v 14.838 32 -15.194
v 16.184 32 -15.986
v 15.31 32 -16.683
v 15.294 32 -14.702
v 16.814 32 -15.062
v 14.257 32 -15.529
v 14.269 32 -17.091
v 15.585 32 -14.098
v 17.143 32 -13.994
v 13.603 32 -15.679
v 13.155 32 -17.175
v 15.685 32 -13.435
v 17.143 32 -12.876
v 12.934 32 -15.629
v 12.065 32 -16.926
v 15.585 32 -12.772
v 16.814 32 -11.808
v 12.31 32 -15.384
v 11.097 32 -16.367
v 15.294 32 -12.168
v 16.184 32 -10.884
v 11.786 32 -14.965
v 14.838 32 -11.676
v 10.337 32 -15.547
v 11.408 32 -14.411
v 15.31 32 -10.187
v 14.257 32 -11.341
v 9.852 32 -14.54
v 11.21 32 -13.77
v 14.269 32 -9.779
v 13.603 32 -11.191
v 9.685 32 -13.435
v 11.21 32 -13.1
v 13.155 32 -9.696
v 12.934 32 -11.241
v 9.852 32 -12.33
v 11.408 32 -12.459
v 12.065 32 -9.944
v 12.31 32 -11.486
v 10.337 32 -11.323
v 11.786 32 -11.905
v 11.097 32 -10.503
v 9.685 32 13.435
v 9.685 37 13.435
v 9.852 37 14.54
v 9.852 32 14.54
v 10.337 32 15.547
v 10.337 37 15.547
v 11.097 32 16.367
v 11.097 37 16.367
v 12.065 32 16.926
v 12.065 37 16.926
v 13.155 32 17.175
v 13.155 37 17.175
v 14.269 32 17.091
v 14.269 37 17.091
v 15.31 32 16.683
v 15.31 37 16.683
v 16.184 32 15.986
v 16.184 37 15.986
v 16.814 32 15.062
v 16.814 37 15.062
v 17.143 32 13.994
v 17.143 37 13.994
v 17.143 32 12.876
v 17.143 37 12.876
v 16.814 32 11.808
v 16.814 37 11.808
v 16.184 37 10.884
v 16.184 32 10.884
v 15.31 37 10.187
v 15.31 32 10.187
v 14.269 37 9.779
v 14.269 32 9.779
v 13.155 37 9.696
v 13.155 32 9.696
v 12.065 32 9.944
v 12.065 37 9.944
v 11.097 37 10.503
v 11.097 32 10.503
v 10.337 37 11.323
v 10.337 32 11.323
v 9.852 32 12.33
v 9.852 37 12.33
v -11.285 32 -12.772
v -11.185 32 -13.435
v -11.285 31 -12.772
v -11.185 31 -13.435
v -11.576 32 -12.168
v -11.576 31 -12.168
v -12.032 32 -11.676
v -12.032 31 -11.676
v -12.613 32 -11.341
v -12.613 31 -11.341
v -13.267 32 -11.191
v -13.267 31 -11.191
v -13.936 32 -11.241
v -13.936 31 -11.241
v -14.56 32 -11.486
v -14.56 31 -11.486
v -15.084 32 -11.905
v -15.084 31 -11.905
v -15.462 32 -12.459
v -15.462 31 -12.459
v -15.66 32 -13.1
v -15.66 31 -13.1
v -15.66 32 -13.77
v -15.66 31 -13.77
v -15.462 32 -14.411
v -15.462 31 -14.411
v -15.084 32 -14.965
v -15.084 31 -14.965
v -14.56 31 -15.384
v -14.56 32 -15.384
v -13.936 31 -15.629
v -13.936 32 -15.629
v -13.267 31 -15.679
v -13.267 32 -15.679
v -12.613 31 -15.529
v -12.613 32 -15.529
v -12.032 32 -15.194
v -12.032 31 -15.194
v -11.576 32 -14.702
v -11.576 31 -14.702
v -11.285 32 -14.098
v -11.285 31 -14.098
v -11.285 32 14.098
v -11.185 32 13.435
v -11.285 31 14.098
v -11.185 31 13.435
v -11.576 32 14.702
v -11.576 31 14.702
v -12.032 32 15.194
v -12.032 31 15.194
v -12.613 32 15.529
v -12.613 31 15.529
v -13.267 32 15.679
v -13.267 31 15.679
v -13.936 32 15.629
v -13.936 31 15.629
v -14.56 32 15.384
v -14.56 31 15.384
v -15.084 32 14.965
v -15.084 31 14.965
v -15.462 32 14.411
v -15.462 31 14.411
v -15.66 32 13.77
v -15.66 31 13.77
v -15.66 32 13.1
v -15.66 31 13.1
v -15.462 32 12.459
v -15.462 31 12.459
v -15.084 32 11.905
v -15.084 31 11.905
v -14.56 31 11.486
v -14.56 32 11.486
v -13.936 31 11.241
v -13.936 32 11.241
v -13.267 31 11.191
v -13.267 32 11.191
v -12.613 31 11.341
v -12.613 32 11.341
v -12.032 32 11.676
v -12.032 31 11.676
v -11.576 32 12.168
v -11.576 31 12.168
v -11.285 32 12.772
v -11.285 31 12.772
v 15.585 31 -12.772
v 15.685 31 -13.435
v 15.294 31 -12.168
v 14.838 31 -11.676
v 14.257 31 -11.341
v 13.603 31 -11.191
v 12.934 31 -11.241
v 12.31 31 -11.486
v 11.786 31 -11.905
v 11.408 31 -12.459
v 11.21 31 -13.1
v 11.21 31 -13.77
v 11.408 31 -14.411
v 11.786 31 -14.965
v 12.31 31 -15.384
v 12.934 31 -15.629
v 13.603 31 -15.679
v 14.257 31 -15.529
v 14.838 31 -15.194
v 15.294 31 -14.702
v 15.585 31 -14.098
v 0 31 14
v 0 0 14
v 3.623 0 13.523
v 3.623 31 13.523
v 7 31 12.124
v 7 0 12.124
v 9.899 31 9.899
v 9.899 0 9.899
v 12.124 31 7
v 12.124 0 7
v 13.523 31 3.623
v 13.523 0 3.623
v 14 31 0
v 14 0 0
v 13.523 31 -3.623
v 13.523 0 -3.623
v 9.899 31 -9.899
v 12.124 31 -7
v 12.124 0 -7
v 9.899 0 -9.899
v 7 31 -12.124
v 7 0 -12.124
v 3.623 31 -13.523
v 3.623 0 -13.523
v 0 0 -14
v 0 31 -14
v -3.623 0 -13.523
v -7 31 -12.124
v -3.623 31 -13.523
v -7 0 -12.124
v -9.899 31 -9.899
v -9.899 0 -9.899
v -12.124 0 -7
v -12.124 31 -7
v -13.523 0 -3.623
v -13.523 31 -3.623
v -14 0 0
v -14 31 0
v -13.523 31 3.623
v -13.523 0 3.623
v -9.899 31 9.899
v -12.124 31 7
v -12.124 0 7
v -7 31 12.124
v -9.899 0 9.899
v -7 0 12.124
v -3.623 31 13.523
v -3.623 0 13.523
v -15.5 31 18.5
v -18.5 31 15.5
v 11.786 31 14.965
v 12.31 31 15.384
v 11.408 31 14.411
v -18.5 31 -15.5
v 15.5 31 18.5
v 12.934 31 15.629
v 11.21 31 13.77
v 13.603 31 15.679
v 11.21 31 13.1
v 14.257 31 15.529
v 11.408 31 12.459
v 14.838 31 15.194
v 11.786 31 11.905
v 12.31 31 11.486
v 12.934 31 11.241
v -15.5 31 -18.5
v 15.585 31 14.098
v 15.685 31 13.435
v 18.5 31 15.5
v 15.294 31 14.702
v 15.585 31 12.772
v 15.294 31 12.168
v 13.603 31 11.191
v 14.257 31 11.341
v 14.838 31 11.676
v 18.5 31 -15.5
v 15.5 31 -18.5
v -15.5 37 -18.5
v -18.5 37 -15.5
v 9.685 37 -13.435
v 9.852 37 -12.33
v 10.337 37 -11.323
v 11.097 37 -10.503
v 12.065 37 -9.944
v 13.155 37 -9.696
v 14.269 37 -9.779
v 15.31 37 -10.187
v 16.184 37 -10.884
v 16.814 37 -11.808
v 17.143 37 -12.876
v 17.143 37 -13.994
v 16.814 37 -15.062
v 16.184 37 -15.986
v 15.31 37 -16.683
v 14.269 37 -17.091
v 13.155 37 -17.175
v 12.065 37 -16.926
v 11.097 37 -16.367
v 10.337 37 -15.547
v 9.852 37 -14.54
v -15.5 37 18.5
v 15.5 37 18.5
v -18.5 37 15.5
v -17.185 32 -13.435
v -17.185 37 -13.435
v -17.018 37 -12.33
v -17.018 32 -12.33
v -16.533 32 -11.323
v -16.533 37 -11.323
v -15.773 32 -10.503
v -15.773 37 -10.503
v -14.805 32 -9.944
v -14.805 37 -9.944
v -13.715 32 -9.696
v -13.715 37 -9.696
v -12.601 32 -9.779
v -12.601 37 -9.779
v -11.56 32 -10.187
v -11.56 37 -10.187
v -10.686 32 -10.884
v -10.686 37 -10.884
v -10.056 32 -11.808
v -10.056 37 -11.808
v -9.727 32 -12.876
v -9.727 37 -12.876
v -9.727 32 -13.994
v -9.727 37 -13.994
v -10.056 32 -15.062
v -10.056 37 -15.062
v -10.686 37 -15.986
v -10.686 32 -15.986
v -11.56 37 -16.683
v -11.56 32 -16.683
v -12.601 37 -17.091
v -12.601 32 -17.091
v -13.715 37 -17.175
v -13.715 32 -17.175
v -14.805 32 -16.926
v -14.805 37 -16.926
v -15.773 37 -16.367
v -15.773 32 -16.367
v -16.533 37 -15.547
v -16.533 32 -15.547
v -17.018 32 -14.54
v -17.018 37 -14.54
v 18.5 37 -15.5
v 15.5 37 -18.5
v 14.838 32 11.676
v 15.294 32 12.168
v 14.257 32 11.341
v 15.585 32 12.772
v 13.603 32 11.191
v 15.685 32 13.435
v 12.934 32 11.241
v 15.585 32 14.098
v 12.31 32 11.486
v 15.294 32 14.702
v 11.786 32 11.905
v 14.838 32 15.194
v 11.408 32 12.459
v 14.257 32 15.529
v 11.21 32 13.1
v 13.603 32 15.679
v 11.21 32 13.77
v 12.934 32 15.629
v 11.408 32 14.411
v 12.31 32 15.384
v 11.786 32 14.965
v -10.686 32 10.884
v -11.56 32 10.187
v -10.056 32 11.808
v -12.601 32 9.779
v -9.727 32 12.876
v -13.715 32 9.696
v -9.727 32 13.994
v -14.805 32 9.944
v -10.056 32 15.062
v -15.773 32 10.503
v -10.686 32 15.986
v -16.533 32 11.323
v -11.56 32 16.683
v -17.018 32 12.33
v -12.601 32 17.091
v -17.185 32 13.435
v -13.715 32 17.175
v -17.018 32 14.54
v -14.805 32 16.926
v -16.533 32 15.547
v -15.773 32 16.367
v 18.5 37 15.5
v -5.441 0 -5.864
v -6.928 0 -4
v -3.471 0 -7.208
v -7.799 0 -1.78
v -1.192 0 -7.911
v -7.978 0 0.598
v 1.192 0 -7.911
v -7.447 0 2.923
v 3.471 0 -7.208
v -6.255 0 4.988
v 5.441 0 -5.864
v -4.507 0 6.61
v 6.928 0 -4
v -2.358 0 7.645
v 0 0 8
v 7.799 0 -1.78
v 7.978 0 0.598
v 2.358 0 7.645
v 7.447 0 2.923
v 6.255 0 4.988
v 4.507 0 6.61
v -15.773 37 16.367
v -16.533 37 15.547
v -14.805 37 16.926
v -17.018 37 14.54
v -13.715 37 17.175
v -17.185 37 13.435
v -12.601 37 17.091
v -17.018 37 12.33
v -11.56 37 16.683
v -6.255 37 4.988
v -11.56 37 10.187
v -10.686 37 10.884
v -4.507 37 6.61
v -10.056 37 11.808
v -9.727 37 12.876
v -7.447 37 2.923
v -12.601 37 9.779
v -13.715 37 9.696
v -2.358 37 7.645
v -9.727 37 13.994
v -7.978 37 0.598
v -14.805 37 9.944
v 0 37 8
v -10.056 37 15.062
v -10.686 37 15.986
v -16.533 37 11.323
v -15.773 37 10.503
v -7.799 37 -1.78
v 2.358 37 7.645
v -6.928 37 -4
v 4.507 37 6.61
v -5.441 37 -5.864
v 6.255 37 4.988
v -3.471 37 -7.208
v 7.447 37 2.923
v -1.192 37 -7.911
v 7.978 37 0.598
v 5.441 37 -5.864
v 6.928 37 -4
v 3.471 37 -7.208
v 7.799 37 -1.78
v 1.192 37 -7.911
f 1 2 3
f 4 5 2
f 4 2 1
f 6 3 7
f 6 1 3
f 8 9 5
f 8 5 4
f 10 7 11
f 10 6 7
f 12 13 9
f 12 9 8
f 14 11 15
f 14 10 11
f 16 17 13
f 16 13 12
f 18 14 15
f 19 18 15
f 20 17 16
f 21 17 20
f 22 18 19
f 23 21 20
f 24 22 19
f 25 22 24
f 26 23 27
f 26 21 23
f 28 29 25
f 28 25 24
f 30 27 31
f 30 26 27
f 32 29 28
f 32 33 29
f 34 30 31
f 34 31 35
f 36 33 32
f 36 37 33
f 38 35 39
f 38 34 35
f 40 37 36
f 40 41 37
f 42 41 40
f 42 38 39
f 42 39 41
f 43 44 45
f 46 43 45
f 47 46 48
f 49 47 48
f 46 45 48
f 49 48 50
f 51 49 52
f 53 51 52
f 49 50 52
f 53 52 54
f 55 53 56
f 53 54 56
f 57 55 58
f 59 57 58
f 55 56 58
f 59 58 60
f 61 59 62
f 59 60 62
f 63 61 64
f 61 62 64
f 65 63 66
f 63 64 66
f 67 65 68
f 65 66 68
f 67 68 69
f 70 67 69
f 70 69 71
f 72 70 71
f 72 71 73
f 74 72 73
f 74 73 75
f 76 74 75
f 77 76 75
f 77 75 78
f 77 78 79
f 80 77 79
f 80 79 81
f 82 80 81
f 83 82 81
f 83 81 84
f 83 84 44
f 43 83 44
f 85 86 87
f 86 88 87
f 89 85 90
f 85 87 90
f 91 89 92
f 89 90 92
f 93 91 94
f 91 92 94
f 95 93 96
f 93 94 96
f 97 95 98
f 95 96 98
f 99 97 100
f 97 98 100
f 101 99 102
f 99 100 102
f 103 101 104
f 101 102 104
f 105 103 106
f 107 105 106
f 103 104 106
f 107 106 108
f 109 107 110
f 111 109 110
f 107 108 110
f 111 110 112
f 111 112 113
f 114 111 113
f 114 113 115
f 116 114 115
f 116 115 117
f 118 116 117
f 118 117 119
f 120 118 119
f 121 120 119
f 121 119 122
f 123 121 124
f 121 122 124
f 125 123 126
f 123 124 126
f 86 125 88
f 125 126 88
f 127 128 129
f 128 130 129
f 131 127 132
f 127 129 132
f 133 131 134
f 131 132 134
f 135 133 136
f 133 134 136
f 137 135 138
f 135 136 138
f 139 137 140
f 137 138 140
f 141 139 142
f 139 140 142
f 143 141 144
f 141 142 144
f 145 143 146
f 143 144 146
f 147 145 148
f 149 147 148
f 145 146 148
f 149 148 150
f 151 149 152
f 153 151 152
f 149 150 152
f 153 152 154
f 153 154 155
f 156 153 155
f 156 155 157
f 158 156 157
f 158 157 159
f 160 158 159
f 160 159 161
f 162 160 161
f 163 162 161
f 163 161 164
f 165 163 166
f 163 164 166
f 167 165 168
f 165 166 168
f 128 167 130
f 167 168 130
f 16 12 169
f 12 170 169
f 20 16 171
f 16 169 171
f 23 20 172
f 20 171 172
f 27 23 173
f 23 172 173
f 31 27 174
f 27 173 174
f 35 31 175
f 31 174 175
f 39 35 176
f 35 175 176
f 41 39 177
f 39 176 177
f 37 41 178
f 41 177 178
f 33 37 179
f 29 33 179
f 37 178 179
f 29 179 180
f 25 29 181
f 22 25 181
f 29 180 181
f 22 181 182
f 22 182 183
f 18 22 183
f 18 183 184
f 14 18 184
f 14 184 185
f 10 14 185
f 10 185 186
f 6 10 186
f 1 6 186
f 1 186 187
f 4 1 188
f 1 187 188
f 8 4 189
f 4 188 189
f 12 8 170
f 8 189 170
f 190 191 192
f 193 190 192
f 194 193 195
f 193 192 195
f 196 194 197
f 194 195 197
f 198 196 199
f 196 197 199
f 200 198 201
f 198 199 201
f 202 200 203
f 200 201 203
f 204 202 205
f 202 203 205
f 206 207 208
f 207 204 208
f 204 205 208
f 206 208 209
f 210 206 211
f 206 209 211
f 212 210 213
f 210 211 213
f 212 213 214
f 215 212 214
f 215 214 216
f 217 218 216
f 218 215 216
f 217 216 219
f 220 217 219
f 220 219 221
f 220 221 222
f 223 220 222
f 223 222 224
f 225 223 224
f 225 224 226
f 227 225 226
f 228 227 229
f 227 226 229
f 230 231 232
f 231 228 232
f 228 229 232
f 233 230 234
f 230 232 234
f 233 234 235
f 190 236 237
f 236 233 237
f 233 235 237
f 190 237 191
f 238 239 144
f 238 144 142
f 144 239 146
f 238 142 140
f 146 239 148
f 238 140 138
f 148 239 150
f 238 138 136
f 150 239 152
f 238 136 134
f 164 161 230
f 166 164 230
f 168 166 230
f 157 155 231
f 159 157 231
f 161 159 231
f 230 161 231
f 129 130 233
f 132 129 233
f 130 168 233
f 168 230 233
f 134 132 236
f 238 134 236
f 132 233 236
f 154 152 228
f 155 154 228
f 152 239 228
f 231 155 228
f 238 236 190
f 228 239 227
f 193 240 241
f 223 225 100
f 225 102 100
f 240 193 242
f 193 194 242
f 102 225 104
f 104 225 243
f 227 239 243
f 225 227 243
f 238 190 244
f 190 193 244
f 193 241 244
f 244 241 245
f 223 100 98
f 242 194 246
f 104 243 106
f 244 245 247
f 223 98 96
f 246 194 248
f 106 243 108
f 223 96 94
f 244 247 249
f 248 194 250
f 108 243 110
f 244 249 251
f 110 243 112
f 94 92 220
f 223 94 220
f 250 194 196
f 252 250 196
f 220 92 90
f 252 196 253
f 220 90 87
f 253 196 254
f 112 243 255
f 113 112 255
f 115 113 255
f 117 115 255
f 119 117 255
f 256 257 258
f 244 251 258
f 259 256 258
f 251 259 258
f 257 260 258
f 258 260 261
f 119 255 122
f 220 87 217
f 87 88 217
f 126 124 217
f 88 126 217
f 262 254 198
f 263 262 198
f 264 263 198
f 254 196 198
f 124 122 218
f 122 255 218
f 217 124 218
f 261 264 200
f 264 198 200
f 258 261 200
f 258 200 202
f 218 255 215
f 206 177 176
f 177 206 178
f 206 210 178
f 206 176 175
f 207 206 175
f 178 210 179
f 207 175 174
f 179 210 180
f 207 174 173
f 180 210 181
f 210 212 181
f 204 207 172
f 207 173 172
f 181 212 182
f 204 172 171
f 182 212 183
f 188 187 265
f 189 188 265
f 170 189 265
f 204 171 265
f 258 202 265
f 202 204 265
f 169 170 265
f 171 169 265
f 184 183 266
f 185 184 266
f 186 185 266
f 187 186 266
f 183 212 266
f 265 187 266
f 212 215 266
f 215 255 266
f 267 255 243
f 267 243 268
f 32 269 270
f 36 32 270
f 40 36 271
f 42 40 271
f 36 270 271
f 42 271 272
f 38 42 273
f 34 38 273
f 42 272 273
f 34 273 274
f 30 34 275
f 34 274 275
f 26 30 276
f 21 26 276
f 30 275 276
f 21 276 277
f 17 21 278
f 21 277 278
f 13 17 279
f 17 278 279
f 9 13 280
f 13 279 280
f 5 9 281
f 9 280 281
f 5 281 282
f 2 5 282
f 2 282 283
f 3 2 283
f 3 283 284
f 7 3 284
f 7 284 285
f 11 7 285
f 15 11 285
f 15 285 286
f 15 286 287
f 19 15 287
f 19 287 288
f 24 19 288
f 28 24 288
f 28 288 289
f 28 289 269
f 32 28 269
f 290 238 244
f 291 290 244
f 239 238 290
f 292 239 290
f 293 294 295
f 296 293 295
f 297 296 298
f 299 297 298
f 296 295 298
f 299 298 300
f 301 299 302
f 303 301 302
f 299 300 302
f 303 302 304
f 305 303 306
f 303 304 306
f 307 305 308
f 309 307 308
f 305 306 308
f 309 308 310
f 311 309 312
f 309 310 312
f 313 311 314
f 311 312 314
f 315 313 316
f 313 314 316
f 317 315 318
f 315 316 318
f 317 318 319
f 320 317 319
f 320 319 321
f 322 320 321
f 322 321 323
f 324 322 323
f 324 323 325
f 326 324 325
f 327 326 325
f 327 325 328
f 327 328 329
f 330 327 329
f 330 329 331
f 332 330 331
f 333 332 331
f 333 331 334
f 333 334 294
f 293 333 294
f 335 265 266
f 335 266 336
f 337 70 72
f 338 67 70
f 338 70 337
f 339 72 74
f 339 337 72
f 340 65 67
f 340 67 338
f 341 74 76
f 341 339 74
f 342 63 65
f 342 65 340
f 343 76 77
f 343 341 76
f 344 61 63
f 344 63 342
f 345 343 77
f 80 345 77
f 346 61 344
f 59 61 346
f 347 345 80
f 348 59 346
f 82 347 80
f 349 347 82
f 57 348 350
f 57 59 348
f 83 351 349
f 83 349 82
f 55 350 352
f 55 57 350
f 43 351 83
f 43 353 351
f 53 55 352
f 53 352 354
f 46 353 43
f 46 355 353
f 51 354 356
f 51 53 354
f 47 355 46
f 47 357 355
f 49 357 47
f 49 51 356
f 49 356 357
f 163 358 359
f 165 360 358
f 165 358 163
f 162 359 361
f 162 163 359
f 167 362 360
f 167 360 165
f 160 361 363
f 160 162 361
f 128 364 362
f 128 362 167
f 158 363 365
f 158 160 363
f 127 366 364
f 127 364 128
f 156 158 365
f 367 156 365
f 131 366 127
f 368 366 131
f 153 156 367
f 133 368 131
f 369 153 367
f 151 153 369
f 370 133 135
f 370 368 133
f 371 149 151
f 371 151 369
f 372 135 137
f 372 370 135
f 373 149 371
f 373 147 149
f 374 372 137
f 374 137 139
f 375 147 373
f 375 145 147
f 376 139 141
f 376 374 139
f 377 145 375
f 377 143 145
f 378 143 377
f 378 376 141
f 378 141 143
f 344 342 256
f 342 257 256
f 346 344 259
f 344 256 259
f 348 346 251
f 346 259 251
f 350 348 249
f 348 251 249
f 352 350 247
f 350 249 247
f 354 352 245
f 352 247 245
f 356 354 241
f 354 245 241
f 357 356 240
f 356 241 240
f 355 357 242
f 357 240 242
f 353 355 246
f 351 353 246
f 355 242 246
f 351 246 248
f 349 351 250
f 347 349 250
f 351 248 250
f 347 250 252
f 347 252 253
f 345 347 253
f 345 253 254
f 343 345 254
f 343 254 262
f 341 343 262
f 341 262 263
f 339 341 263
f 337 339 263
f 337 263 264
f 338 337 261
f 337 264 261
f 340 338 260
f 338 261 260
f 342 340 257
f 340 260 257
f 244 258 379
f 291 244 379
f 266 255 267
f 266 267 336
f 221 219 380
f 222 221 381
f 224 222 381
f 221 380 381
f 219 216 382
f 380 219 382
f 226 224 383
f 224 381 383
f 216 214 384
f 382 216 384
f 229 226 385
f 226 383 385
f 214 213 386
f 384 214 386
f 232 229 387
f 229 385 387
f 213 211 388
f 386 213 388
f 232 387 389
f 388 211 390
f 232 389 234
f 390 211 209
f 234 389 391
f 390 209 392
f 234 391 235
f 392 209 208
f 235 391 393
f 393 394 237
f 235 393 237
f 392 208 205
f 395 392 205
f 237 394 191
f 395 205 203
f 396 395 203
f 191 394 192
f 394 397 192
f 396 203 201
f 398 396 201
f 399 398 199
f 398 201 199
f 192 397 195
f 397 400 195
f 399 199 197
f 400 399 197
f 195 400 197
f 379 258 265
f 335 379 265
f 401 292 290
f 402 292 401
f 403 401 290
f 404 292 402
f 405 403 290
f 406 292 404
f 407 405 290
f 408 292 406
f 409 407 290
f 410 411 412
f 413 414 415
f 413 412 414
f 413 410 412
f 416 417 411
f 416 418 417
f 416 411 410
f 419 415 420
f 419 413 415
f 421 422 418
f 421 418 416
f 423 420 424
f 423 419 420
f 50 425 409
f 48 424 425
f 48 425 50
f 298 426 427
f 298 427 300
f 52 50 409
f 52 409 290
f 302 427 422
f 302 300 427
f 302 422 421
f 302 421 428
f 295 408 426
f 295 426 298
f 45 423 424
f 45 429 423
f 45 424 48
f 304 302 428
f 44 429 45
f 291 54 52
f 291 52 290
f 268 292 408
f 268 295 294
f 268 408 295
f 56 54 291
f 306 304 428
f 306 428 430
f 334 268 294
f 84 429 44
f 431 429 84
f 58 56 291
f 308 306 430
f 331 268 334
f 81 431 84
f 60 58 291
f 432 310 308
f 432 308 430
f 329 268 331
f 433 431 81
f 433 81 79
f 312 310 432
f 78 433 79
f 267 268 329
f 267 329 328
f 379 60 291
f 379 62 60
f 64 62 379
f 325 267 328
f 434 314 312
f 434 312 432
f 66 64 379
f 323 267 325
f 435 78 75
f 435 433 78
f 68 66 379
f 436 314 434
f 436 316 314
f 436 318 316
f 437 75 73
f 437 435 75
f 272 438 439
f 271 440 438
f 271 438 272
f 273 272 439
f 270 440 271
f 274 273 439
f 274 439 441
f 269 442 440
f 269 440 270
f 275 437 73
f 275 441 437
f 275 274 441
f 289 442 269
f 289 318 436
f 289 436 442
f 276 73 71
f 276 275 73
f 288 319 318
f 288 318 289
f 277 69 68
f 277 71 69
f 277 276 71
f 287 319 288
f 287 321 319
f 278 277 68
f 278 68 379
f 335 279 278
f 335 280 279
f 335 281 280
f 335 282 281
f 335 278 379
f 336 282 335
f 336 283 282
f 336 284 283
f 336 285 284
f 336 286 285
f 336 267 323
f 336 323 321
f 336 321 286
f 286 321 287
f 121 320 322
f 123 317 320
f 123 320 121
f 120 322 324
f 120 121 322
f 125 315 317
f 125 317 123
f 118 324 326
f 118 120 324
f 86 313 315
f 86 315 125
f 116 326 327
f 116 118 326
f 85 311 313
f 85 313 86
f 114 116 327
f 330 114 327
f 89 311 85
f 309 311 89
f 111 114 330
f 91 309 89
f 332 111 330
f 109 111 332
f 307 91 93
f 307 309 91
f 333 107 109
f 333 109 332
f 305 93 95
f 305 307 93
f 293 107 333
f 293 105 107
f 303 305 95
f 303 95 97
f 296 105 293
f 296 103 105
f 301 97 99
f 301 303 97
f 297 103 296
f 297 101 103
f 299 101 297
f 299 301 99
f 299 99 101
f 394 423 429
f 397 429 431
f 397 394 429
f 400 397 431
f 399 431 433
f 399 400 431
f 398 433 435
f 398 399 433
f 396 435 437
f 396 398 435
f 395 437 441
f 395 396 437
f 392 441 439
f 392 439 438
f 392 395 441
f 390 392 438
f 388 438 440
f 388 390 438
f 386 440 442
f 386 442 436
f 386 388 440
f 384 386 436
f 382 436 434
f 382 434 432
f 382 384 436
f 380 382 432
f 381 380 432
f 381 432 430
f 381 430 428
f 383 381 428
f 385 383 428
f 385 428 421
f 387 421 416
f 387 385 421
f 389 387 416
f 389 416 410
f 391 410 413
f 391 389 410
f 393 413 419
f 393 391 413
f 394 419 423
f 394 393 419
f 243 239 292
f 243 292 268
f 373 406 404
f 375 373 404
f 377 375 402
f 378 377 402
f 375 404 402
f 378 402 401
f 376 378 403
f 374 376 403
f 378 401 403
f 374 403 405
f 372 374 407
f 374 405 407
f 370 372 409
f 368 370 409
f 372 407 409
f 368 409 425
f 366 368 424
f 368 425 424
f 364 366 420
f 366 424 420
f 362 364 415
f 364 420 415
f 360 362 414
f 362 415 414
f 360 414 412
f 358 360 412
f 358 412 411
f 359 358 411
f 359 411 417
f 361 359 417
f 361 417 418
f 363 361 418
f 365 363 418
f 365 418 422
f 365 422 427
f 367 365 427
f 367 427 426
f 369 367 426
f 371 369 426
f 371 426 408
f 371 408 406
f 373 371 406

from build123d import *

# Parameters (mm, degrees)
SKETCH_1_R                   = 14
SKETCH_1_R_2                 = 8
EXTRUDE_1_DEPTH              = 37
EXTRUDE_START                = -6
SKETCH_2_W                   = 37
SKETCH_2_H                   = 37
SKETCH_2_R                   = 8
EXTRUDE_2_DEPTH              = 6
HOLE_WIZARD_M3_1_D           = 4.5
HOLE_WIZARD_M3_1_CBORE_D     = 7.5
HOLE_WIZARD_M3_1_CBORE_DEPTH = 5
CHAMFER_1_SIZE               = 3


with BuildPart() as part:
    # 草图1 → 凸台-拉伸1 (new body)
    with BuildSketch(Plane(origin=(0, 0, 0), x_dir=(1, 0, 0), z_dir=(0, 1, 0))):
        with Locations(Location((0, 0, 0), (0, 0, 270))):
            Circle(SKETCH_1_R)
        with Locations(Location((0, 0, 0), (0, 0, 270))):
            Circle(SKETCH_1_R_2, mode=Mode.SUBTRACT)
    extrude(amount=EXTRUDE_1_DEPTH)

    # 草图2 → 凸台-拉伸2 (add)
    with BuildSketch(Plane(origin=(0, 37, 0), x_dir=(1, 0, 0), z_dir=(0, 1, 0)).offset(EXTRUDE_START)):
        Rectangle(SKETCH_2_W, SKETCH_2_H)
        with Locations(Location((0, 0, 0), (0, 0, 270))):
            Circle(SKETCH_2_R, mode=Mode.SUBTRACT)
    extrude(amount=EXTRUDE_2_DEPTH)

    # M3 六角头螺栓的柱形沉头孔1 (through all)
    with Locations(Plane(origin=(0, 37, 0), x_dir=(-1, 0, 0), z_dir=(0, 1, 0))):
        with Locations((-13.435028843, 13.435028843), (13.435028843, 13.435028843), (13.435028843, -13.435028843), (-13.435028843, -13.435028843)):
            CounterBoreHole(HOLE_WIZARD_M3_1_D / 2, HOLE_WIZARD_M3_1_CBORE_D / 2, HOLE_WIZARD_M3_1_CBORE_DEPTH)

    # 倒角1
    chamfer_1_edges = [part.edges().sort_by_distance(p)[0] for p in [
        (-18.5, 34, 18.5),
        (-18.5, 34, -18.5),
        (18.5, 34, -18.5),
        (18.5, 34, 18.5),
    ]]
    chamfer(chamfer_1_edges, length=CHAMFER_1_SIZE)


solid = part.part
